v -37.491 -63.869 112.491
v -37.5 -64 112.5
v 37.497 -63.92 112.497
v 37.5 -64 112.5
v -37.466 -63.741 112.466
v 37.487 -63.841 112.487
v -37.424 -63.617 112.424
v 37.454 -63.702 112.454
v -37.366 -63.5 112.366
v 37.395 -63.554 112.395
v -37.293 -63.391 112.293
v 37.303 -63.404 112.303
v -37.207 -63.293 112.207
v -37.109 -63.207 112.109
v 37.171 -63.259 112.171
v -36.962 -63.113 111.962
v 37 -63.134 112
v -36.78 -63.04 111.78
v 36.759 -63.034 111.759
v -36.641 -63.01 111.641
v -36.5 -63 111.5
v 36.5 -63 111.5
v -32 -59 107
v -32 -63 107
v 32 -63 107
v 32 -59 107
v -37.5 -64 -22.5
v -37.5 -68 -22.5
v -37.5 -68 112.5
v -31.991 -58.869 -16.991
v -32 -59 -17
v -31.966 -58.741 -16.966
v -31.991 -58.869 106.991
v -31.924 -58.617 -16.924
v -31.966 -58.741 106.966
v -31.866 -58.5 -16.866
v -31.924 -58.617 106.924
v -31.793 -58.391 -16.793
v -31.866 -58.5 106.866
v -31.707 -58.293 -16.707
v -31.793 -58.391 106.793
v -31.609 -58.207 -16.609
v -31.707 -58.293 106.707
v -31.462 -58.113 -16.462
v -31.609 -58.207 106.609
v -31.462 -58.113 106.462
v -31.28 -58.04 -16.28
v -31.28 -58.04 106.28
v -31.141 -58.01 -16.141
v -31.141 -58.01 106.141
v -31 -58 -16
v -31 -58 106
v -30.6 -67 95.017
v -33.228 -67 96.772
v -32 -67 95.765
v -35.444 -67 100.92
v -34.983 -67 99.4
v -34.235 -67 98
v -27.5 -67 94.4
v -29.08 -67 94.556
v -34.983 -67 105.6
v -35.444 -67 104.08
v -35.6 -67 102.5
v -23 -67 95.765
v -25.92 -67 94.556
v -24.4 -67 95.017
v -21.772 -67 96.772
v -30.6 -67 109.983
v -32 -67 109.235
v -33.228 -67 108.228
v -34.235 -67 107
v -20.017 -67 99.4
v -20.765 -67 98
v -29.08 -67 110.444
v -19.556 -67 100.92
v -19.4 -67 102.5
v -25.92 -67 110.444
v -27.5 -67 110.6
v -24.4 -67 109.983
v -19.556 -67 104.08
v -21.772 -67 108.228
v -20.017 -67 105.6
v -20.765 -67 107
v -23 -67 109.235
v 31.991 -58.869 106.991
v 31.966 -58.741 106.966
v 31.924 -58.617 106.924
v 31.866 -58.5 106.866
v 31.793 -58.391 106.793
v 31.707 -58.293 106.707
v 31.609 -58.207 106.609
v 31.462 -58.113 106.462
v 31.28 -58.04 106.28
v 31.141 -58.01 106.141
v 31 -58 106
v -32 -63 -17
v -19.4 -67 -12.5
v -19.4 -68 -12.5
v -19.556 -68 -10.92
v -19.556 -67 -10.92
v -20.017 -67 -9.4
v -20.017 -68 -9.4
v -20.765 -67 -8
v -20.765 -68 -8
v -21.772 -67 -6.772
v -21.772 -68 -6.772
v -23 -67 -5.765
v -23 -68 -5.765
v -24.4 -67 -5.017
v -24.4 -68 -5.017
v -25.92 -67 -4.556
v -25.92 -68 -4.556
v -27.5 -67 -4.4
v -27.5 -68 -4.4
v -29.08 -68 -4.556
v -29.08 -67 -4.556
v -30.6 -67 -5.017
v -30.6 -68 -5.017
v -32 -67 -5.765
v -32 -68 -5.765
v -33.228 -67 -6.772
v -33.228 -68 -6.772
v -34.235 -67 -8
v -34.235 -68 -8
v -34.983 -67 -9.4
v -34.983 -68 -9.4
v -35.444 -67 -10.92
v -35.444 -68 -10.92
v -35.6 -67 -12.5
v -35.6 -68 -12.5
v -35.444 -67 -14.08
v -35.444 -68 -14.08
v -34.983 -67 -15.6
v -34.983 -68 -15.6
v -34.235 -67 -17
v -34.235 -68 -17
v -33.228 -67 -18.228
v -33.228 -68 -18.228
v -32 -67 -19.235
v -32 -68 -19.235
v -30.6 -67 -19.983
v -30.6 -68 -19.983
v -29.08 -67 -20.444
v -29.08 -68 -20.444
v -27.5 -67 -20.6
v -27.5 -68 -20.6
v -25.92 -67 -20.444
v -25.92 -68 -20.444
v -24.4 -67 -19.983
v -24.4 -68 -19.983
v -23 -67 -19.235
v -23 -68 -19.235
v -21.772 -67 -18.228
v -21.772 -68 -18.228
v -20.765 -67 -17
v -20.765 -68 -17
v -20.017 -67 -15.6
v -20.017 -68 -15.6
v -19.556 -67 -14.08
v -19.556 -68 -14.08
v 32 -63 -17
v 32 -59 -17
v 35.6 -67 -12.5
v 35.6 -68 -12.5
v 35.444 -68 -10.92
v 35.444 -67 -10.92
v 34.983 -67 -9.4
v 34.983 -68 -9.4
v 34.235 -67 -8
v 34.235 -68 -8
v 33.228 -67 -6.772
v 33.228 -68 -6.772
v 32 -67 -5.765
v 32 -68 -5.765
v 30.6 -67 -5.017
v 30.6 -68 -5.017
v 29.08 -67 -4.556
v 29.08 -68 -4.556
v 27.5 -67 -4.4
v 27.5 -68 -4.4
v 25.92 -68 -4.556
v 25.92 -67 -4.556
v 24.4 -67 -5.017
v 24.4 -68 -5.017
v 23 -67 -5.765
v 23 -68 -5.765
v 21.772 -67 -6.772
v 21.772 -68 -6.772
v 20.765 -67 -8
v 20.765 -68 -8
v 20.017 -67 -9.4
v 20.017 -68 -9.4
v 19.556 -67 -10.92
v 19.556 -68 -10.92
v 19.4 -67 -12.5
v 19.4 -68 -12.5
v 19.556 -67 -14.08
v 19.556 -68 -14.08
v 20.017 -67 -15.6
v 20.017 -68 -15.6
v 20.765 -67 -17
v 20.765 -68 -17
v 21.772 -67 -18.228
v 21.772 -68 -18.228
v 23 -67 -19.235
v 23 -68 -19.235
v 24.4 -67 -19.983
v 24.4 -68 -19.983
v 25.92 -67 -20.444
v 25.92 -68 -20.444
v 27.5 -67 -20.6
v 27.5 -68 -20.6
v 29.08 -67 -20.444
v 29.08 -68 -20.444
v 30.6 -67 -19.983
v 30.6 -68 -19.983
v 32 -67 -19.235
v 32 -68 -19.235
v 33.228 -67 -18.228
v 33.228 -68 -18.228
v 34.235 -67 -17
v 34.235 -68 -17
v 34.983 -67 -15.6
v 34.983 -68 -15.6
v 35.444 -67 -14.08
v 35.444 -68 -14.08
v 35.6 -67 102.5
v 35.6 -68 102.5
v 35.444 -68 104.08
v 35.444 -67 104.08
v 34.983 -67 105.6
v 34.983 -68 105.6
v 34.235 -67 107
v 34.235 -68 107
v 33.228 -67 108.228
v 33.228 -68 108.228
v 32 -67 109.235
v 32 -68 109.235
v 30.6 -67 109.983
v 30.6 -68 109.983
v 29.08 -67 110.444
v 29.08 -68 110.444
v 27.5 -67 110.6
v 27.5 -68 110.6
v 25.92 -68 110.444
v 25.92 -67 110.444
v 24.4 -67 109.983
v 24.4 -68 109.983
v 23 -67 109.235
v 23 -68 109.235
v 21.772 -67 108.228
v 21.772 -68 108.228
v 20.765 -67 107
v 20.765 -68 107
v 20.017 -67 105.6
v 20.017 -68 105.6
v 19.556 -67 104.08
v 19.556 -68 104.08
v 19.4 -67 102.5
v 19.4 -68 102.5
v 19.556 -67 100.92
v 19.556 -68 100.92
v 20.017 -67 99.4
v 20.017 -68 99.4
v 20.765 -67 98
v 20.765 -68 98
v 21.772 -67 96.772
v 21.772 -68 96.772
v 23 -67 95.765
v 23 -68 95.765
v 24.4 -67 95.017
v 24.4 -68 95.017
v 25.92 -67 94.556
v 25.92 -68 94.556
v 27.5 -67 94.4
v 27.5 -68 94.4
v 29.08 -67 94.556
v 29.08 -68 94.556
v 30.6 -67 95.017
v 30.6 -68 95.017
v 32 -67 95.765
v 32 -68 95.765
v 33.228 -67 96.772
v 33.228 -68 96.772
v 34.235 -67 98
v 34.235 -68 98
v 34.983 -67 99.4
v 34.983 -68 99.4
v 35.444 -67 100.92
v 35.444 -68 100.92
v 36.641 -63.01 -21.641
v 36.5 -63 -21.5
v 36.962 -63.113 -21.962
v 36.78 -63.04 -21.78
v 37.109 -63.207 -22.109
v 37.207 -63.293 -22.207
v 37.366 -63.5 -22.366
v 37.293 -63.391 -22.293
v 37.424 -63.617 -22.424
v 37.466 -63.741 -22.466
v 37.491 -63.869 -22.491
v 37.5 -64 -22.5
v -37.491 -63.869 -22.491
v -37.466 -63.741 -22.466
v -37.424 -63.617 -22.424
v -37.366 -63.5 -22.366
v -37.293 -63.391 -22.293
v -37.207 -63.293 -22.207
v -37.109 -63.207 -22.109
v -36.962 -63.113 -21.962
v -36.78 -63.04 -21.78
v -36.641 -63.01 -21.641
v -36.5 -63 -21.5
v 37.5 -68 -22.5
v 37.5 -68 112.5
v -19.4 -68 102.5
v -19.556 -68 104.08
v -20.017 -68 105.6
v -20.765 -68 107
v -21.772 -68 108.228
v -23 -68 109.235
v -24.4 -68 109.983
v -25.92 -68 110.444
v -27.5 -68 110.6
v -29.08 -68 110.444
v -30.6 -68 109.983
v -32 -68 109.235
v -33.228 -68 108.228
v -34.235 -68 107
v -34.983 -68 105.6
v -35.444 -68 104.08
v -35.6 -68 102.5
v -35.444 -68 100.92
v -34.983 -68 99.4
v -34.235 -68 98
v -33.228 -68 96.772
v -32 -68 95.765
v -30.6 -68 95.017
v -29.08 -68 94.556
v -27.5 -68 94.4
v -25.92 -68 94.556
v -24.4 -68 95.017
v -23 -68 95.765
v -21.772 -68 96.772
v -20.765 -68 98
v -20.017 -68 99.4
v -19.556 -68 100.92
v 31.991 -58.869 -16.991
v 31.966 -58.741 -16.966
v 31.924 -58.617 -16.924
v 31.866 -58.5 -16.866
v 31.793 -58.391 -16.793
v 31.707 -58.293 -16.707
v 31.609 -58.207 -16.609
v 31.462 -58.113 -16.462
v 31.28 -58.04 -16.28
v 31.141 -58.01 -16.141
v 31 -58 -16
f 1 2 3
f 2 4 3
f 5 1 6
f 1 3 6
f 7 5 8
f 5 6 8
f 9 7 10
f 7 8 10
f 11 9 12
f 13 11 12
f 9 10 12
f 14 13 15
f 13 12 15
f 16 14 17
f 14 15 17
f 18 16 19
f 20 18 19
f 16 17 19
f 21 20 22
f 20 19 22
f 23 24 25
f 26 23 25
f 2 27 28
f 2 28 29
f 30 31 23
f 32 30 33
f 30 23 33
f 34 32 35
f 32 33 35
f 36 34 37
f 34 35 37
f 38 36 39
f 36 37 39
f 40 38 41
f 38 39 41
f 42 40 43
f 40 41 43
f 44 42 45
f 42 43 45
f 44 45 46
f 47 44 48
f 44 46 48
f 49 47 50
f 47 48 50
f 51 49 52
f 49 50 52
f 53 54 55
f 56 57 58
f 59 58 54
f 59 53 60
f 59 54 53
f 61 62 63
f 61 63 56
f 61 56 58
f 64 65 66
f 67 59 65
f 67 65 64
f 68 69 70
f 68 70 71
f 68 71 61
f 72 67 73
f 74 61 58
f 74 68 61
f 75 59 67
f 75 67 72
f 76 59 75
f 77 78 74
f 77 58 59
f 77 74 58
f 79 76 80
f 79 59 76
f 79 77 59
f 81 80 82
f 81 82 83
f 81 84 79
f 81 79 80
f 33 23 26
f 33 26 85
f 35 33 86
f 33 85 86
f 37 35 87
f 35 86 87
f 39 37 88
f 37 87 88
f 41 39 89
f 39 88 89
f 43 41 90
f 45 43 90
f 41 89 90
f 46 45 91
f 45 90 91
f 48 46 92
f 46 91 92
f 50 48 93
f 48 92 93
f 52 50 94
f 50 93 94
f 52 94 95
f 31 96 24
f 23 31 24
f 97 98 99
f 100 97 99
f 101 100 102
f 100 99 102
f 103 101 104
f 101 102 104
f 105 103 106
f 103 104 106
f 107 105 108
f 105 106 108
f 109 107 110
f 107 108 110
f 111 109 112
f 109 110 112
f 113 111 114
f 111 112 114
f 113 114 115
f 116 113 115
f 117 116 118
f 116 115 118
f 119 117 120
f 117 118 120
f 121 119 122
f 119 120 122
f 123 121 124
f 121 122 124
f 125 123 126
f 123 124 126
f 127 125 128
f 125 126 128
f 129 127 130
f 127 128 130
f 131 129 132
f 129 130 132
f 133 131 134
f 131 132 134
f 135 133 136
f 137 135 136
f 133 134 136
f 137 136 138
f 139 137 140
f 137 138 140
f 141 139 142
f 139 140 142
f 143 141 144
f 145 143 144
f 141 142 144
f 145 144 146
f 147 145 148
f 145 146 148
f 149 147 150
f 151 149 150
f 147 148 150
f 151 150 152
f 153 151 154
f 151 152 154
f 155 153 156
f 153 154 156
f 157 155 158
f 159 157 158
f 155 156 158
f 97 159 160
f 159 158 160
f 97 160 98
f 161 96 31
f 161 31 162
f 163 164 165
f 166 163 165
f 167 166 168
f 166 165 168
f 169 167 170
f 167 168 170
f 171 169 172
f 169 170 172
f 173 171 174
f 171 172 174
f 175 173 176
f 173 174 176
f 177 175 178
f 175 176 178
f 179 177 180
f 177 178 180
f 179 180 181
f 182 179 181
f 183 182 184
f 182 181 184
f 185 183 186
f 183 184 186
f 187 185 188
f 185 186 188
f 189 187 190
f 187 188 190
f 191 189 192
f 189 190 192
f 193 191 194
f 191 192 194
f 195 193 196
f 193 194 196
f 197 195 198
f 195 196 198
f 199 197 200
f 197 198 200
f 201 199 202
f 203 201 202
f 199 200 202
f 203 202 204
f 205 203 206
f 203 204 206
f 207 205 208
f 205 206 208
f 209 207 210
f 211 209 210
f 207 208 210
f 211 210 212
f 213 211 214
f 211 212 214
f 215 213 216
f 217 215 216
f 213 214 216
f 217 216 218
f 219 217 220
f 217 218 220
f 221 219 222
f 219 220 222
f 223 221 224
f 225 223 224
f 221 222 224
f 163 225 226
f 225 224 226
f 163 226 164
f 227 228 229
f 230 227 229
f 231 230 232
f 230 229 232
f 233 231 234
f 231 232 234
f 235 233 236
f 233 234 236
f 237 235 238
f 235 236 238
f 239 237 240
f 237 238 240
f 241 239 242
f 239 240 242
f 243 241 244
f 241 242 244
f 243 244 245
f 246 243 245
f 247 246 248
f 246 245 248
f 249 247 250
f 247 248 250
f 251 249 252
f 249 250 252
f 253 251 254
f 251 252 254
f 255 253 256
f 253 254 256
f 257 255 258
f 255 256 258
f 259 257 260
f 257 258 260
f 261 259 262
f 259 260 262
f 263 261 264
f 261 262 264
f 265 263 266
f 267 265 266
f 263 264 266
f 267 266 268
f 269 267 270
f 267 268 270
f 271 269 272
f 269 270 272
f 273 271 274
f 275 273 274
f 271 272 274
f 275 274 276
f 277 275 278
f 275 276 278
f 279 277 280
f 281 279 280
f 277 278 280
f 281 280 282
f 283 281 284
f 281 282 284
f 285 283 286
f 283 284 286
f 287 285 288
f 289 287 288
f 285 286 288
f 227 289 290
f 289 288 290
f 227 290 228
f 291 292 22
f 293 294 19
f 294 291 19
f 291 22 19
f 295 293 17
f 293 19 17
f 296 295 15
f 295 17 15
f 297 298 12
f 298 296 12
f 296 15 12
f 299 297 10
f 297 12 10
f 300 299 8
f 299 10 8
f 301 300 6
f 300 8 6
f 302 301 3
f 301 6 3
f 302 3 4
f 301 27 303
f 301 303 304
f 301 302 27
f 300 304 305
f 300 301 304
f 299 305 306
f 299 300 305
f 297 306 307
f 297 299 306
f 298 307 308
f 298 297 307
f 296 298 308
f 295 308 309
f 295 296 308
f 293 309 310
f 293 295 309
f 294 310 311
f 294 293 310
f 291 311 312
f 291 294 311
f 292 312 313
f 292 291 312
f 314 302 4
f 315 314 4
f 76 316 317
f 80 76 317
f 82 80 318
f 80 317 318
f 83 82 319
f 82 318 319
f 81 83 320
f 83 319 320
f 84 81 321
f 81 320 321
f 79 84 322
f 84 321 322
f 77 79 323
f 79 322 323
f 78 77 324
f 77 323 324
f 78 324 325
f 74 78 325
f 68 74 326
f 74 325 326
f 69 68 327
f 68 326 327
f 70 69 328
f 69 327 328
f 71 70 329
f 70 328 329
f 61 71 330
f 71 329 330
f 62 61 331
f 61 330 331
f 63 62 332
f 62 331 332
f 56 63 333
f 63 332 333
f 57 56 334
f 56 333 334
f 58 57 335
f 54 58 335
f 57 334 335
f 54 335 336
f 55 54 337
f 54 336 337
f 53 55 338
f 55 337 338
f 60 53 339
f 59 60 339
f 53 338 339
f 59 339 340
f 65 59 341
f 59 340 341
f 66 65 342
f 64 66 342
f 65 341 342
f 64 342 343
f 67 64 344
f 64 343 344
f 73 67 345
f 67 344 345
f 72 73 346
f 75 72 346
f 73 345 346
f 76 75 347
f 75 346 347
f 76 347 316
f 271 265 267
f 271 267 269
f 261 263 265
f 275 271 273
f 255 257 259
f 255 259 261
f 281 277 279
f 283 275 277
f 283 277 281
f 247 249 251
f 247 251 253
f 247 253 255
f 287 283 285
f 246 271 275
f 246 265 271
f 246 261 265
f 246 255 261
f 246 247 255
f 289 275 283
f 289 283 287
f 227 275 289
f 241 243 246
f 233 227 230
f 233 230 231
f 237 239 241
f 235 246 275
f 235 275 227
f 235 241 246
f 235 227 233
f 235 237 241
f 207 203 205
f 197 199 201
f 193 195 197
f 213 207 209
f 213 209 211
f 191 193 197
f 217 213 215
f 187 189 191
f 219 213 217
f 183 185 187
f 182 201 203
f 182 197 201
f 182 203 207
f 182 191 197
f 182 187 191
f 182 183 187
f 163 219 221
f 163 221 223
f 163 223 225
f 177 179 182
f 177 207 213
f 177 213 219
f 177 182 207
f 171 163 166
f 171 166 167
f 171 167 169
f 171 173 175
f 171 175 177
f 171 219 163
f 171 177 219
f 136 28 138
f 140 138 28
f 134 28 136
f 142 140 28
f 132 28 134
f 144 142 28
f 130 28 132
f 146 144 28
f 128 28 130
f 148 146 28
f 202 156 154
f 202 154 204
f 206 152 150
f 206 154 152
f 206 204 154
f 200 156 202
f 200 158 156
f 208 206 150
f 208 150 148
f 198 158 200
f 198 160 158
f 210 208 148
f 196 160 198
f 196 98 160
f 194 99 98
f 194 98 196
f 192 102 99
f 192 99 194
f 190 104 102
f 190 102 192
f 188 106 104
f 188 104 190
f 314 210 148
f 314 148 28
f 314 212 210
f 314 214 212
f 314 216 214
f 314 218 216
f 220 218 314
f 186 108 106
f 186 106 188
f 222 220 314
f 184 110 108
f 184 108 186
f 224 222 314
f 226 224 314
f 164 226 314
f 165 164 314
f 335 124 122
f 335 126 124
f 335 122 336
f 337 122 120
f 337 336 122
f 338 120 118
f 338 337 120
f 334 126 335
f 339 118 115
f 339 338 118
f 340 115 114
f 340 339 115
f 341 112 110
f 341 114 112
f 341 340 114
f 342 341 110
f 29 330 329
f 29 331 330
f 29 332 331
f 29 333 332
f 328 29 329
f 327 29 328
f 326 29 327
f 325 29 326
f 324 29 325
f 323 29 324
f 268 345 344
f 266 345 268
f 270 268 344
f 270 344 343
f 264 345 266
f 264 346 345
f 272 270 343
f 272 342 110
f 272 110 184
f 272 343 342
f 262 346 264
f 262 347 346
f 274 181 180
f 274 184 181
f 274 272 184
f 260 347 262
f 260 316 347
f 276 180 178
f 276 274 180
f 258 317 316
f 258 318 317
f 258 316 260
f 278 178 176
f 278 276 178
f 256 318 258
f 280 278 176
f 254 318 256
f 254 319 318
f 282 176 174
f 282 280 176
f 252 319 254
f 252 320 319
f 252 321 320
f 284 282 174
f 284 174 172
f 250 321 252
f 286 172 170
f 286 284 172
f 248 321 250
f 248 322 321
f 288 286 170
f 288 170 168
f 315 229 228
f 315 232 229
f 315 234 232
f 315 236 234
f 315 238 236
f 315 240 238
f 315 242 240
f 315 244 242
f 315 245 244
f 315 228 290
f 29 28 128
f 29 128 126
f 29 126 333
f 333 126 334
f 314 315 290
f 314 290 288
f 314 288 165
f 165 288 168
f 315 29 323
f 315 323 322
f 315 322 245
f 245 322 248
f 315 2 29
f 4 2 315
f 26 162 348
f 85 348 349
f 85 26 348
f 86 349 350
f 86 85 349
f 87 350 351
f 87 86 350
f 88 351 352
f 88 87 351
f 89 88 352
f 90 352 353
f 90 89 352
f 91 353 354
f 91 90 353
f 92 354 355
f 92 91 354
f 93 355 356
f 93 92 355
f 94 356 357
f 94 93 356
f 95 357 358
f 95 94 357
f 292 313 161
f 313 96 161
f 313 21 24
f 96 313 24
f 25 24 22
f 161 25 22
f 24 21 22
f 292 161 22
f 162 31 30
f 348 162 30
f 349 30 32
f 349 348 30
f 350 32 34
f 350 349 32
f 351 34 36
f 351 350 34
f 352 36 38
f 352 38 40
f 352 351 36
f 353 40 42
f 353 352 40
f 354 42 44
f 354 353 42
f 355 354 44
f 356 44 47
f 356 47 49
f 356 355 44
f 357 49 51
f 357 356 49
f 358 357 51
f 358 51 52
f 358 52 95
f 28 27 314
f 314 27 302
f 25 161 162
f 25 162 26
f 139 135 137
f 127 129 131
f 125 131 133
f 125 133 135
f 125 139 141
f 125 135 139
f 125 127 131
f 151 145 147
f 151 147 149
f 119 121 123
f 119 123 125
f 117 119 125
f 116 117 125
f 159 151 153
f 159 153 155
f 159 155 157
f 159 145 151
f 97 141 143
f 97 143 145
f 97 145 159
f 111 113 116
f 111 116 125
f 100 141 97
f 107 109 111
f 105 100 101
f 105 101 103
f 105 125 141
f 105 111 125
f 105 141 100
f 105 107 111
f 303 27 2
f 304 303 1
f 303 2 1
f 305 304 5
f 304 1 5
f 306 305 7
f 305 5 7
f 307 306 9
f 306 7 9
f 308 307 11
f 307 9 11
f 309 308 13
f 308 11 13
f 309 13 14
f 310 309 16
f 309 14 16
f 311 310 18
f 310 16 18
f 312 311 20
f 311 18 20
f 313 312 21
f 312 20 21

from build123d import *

# Parameters (mm, degrees)
SKETCH032_W     = 64
SKETCH032_H     = 124
PAD019_DEPTH    = 5
SKETCH033_W     = 75
SKETCH033_H     = 135
PAD020_DEPTH    = 5
FILLET001_R     = 1
SKETCH034_R     = 8.1
POCKET002_DEPTH = 1


with BuildPart() as part:
    # Sketch032 → Pad019 (new body)
    with BuildSketch(Plane.XZ):
        with Locations((0, 45)):
            Rectangle(SKETCH032_W, SKETCH032_H)
    extrude(amount=-PAD019_DEPTH)

    # Sketch033 → Pad020 (join)
    with BuildSketch(Plane.XZ):
        with Locations((0, 45)):
            Rectangle(SKETCH033_W, SKETCH033_H)
    extrude(amount=PAD020_DEPTH)

    # Fillet001
    fillet001_edges = [part.edges().sort_by_distance(p)[0] for p in [
        (0, 0, -22.5),
        (-37.5, 0, 45),
        (37.5, 0, 45),
        (32, 5, 45),
        (0, 5, -17),
        (0, 0, 112.5),
        (0, 5, 107),
        (-32, 5, 45),
    ]]
    fillet(fillet001_edges, radius=FILLET001_R)

    # Sketch034 (on Face19 of Fillet001) → Pocket002 (cut)
    with BuildSketch(Plane.XZ.offset(5)):
        with Locations((-27.5, 102.5)):
            Circle(SKETCH034_R)
        with Locations((27.5, 102.5)):
            Circle(SKETCH034_R)
        with Locations((-27.5, -12.5)):
            Circle(SKETCH034_R)
        with Locations((27.5, -12.5)):
            Circle(SKETCH034_R)
    extrude(amount=-POCKET002_DEPTH, mode=Mode.SUBTRACT)


with BuildPart() as part_1:
    # Body014 placement: moved
    add(part.part.moved(Location((0, -63, 0))))


solid = part_1.part
